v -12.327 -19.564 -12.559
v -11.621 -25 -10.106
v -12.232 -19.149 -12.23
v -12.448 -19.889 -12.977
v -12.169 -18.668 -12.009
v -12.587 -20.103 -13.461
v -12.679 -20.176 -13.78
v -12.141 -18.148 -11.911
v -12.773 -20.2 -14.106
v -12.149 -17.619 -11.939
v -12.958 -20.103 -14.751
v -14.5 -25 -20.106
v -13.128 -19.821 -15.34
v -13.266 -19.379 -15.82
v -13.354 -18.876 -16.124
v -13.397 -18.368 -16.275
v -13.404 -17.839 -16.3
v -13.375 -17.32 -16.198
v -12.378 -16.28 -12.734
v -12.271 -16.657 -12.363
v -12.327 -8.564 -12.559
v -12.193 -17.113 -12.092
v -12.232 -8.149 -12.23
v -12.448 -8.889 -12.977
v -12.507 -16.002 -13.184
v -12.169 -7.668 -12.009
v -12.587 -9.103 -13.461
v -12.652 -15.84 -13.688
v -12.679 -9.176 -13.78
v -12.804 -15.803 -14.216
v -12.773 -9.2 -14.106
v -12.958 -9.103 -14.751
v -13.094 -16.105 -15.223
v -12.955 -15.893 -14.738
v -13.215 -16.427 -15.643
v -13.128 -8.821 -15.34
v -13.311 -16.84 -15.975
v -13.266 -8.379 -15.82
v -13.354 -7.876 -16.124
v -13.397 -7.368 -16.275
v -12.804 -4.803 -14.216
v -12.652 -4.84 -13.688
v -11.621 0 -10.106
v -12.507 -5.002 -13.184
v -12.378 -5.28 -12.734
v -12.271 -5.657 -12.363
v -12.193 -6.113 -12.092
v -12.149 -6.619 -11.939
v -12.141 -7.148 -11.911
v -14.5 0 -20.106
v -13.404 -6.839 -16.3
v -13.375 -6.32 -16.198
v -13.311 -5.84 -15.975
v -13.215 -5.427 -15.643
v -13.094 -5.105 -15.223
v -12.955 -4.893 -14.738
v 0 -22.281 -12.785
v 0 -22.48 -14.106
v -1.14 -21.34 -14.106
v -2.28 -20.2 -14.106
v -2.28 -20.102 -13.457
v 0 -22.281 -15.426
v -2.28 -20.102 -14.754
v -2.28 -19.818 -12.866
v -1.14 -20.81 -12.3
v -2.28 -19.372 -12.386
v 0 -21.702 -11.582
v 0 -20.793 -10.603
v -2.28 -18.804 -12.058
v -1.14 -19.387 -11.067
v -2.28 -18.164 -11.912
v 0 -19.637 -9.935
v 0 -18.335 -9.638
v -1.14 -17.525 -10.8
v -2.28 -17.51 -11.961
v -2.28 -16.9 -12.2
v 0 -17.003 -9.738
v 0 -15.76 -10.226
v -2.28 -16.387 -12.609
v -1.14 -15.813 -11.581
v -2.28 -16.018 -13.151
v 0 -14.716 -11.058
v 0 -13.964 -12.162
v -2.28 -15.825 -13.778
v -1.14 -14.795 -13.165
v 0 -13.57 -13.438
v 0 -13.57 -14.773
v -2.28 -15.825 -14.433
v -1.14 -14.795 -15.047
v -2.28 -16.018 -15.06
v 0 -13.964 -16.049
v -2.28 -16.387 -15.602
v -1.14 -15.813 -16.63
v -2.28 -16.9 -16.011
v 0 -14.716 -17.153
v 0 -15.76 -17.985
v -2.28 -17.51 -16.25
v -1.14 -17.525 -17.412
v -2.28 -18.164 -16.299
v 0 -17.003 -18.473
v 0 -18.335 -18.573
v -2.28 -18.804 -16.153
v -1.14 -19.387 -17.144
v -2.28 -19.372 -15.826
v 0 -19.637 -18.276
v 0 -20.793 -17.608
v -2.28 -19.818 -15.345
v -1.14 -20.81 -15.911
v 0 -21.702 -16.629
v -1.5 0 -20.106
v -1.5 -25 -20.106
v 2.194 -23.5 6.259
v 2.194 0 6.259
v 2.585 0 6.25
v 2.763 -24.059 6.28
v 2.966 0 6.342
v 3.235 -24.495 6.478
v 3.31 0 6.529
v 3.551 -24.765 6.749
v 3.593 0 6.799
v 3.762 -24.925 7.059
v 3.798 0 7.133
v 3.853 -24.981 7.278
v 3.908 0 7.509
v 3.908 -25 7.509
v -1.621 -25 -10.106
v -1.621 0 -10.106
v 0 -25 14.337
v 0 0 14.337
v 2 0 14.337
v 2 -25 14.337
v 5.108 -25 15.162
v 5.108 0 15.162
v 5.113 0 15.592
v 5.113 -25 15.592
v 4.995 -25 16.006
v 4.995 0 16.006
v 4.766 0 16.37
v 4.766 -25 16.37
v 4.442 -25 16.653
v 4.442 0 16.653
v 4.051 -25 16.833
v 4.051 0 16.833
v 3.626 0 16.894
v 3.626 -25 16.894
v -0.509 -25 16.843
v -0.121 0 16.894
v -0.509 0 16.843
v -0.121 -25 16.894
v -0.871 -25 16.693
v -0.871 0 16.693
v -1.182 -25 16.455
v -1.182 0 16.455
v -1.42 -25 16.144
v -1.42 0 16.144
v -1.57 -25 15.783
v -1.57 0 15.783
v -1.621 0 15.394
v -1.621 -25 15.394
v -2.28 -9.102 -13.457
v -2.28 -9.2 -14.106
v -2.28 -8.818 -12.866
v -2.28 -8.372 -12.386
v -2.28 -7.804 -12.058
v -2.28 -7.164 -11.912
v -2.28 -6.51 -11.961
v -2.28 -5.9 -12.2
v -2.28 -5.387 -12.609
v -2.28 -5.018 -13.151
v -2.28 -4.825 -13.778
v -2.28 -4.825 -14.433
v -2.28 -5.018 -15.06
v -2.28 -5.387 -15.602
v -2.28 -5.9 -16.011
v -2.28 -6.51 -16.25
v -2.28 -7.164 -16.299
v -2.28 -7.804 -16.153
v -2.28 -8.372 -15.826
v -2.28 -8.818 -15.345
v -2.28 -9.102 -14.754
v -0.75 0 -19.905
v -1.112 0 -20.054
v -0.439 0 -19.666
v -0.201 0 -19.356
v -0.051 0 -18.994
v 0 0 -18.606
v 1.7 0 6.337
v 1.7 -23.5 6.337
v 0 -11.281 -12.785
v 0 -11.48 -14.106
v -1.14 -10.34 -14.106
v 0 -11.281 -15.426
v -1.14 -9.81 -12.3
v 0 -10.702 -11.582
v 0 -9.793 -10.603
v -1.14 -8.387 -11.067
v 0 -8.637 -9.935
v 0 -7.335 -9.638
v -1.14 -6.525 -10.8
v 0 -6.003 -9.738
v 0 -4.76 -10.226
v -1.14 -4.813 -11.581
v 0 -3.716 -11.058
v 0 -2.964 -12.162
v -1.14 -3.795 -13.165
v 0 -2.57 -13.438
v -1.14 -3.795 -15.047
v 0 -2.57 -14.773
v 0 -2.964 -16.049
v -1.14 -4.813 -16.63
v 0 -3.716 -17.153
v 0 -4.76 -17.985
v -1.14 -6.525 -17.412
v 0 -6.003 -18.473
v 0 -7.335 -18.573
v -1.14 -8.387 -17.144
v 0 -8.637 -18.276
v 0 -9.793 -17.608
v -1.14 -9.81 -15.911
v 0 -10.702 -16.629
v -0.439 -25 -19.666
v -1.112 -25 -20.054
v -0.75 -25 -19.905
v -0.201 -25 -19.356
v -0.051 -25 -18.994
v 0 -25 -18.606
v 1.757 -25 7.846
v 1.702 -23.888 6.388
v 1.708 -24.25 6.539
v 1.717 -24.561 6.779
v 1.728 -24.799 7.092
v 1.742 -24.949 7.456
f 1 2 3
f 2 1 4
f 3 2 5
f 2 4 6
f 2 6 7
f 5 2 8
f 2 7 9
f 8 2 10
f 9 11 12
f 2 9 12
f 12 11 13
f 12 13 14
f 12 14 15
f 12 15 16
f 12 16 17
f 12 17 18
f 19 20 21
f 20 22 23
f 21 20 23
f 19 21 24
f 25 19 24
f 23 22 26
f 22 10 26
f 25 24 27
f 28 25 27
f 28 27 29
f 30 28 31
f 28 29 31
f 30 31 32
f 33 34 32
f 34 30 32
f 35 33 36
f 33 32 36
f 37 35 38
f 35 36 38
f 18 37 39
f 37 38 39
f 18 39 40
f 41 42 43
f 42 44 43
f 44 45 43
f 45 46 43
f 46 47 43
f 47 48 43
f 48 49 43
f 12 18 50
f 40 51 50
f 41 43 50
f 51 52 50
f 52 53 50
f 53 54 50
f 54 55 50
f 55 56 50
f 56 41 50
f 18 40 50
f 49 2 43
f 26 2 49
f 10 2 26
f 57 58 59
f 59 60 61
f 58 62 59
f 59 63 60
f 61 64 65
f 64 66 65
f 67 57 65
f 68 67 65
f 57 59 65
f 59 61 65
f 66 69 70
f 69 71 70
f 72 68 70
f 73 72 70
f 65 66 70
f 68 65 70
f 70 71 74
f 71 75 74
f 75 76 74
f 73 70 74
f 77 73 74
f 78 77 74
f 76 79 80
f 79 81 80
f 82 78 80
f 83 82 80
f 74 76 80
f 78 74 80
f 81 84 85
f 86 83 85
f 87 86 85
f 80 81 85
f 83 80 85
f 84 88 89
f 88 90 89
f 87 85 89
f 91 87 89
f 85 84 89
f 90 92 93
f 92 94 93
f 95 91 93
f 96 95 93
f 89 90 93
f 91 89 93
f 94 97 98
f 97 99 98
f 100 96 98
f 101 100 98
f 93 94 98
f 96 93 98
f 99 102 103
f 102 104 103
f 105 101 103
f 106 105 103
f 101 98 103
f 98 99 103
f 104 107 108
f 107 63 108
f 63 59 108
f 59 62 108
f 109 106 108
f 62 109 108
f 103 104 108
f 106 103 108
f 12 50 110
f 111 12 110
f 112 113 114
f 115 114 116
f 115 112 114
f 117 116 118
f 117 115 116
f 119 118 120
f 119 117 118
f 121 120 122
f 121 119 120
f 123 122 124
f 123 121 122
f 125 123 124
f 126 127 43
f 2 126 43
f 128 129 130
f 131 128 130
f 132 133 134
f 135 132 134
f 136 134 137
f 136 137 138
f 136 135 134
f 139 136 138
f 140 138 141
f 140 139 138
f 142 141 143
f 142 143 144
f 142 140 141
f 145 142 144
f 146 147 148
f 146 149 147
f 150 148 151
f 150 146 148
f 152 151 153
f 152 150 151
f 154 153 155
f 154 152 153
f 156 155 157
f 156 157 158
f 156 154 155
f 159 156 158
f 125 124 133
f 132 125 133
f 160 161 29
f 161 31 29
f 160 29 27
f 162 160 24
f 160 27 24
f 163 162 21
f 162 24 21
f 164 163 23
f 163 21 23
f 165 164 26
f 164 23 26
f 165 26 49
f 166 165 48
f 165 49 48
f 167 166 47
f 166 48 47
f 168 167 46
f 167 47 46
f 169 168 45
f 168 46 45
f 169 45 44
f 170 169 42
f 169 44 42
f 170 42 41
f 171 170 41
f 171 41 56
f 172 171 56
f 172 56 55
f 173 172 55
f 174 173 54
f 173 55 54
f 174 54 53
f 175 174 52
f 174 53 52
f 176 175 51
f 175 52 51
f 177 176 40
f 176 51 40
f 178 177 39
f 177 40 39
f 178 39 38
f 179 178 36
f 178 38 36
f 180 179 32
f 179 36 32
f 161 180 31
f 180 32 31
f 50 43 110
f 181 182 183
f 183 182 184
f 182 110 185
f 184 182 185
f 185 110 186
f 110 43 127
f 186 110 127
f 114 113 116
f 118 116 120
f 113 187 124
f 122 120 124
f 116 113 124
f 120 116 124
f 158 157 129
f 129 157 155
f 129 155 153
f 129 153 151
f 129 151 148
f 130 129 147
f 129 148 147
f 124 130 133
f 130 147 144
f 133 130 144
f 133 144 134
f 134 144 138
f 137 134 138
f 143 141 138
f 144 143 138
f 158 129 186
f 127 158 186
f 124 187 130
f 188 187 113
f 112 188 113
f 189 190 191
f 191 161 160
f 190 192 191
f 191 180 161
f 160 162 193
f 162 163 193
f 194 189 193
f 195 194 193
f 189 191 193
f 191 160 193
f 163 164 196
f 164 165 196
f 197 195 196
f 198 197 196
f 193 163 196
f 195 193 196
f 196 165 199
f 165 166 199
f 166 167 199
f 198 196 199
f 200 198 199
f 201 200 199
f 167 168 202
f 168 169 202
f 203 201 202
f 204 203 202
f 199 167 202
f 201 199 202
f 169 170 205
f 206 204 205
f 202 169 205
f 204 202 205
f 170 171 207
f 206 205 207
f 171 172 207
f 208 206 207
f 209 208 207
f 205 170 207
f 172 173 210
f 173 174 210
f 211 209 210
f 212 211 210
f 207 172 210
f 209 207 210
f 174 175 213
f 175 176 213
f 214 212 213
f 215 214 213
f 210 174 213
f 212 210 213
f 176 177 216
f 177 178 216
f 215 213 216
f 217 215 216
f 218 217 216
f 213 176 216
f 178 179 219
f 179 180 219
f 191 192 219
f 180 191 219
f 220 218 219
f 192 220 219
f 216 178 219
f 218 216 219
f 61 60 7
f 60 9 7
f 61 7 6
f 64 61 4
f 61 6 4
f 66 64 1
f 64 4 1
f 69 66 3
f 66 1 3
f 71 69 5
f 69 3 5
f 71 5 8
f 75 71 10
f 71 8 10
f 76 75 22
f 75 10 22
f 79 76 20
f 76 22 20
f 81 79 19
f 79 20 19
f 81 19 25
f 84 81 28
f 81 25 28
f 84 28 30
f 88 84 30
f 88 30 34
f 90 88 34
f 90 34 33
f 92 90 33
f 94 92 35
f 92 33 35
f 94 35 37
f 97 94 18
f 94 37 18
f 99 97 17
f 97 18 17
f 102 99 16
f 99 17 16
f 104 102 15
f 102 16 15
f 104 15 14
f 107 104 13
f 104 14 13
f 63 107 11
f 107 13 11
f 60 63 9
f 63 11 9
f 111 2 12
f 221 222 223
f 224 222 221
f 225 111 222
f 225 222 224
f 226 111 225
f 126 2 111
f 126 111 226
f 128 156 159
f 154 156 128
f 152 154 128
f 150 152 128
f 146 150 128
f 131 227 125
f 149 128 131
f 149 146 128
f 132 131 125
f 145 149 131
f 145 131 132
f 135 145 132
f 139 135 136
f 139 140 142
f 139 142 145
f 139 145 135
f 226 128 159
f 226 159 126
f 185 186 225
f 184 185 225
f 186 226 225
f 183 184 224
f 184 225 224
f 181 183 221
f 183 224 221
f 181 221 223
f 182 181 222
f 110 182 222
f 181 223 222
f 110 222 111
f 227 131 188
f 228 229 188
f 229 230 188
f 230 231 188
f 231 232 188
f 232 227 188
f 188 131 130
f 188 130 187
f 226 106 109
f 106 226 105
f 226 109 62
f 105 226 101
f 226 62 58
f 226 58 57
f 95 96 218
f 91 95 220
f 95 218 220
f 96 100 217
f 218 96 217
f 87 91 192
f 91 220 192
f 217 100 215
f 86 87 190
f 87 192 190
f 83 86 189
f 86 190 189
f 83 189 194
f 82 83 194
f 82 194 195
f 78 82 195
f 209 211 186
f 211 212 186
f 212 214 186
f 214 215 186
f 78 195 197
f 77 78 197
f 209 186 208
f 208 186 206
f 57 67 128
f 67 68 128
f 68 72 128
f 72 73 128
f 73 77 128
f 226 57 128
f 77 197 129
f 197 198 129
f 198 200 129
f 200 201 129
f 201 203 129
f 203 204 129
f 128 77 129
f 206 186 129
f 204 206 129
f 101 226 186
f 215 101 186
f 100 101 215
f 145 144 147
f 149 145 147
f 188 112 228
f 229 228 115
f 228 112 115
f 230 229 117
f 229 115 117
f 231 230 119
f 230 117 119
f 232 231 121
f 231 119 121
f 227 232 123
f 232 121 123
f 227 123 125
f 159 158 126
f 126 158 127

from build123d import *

# Parameters (mm, degrees)
F1_DEPTH       = 25
F2_R           = 1.5
F4_D           = 4.4
F4_CSINK_D     = 8.96
F4_CSINK_ANGLE = 90


with BuildPart() as f1:
    # F0 (on Front) → F1 (new body)
    with BuildSketch(Plane.XZ):
        Polygon((0, -20.1055445863), (0, -13.0393103669), (0, 14.3368082835), (2, 14.3368082835), (1.7, 6.3368082835), (3.6758784442, 6.0271239706), (5.3791421656, 16.8944554137), (-1.6208578344, 16.8944554137), (-1.6208578344, -10.1055445863), (-11.6208578344, -10.1055445863), (-14.5, -20.1055445863), align=None)
    extrude(amount=F1_DEPTH)

    # F2
    f2_edges = [f1.edges().sort_by_distance(p)[0] for p in [
        (-1.620858, -12.5, 16.894455),
        (5.379142, -12.5, 16.894455),
        (0, -12.5, -20.105545),
        (2.687939, -25, 6.181966),
        (3.675878, -12.5, 6.027124),
    ]]
    fillet(f2_edges, radius=F2_R)

    # F4 (through all)
    with Locations(Plane.YZ):
        with Locations((-7, -14.1055445863), (-18, -14.1055445863)):
            CounterSinkHole(F4_D / 2, F4_CSINK_D / 2, counter_sink_angle=F4_CSINK_ANGLE)


solid = f1.part
